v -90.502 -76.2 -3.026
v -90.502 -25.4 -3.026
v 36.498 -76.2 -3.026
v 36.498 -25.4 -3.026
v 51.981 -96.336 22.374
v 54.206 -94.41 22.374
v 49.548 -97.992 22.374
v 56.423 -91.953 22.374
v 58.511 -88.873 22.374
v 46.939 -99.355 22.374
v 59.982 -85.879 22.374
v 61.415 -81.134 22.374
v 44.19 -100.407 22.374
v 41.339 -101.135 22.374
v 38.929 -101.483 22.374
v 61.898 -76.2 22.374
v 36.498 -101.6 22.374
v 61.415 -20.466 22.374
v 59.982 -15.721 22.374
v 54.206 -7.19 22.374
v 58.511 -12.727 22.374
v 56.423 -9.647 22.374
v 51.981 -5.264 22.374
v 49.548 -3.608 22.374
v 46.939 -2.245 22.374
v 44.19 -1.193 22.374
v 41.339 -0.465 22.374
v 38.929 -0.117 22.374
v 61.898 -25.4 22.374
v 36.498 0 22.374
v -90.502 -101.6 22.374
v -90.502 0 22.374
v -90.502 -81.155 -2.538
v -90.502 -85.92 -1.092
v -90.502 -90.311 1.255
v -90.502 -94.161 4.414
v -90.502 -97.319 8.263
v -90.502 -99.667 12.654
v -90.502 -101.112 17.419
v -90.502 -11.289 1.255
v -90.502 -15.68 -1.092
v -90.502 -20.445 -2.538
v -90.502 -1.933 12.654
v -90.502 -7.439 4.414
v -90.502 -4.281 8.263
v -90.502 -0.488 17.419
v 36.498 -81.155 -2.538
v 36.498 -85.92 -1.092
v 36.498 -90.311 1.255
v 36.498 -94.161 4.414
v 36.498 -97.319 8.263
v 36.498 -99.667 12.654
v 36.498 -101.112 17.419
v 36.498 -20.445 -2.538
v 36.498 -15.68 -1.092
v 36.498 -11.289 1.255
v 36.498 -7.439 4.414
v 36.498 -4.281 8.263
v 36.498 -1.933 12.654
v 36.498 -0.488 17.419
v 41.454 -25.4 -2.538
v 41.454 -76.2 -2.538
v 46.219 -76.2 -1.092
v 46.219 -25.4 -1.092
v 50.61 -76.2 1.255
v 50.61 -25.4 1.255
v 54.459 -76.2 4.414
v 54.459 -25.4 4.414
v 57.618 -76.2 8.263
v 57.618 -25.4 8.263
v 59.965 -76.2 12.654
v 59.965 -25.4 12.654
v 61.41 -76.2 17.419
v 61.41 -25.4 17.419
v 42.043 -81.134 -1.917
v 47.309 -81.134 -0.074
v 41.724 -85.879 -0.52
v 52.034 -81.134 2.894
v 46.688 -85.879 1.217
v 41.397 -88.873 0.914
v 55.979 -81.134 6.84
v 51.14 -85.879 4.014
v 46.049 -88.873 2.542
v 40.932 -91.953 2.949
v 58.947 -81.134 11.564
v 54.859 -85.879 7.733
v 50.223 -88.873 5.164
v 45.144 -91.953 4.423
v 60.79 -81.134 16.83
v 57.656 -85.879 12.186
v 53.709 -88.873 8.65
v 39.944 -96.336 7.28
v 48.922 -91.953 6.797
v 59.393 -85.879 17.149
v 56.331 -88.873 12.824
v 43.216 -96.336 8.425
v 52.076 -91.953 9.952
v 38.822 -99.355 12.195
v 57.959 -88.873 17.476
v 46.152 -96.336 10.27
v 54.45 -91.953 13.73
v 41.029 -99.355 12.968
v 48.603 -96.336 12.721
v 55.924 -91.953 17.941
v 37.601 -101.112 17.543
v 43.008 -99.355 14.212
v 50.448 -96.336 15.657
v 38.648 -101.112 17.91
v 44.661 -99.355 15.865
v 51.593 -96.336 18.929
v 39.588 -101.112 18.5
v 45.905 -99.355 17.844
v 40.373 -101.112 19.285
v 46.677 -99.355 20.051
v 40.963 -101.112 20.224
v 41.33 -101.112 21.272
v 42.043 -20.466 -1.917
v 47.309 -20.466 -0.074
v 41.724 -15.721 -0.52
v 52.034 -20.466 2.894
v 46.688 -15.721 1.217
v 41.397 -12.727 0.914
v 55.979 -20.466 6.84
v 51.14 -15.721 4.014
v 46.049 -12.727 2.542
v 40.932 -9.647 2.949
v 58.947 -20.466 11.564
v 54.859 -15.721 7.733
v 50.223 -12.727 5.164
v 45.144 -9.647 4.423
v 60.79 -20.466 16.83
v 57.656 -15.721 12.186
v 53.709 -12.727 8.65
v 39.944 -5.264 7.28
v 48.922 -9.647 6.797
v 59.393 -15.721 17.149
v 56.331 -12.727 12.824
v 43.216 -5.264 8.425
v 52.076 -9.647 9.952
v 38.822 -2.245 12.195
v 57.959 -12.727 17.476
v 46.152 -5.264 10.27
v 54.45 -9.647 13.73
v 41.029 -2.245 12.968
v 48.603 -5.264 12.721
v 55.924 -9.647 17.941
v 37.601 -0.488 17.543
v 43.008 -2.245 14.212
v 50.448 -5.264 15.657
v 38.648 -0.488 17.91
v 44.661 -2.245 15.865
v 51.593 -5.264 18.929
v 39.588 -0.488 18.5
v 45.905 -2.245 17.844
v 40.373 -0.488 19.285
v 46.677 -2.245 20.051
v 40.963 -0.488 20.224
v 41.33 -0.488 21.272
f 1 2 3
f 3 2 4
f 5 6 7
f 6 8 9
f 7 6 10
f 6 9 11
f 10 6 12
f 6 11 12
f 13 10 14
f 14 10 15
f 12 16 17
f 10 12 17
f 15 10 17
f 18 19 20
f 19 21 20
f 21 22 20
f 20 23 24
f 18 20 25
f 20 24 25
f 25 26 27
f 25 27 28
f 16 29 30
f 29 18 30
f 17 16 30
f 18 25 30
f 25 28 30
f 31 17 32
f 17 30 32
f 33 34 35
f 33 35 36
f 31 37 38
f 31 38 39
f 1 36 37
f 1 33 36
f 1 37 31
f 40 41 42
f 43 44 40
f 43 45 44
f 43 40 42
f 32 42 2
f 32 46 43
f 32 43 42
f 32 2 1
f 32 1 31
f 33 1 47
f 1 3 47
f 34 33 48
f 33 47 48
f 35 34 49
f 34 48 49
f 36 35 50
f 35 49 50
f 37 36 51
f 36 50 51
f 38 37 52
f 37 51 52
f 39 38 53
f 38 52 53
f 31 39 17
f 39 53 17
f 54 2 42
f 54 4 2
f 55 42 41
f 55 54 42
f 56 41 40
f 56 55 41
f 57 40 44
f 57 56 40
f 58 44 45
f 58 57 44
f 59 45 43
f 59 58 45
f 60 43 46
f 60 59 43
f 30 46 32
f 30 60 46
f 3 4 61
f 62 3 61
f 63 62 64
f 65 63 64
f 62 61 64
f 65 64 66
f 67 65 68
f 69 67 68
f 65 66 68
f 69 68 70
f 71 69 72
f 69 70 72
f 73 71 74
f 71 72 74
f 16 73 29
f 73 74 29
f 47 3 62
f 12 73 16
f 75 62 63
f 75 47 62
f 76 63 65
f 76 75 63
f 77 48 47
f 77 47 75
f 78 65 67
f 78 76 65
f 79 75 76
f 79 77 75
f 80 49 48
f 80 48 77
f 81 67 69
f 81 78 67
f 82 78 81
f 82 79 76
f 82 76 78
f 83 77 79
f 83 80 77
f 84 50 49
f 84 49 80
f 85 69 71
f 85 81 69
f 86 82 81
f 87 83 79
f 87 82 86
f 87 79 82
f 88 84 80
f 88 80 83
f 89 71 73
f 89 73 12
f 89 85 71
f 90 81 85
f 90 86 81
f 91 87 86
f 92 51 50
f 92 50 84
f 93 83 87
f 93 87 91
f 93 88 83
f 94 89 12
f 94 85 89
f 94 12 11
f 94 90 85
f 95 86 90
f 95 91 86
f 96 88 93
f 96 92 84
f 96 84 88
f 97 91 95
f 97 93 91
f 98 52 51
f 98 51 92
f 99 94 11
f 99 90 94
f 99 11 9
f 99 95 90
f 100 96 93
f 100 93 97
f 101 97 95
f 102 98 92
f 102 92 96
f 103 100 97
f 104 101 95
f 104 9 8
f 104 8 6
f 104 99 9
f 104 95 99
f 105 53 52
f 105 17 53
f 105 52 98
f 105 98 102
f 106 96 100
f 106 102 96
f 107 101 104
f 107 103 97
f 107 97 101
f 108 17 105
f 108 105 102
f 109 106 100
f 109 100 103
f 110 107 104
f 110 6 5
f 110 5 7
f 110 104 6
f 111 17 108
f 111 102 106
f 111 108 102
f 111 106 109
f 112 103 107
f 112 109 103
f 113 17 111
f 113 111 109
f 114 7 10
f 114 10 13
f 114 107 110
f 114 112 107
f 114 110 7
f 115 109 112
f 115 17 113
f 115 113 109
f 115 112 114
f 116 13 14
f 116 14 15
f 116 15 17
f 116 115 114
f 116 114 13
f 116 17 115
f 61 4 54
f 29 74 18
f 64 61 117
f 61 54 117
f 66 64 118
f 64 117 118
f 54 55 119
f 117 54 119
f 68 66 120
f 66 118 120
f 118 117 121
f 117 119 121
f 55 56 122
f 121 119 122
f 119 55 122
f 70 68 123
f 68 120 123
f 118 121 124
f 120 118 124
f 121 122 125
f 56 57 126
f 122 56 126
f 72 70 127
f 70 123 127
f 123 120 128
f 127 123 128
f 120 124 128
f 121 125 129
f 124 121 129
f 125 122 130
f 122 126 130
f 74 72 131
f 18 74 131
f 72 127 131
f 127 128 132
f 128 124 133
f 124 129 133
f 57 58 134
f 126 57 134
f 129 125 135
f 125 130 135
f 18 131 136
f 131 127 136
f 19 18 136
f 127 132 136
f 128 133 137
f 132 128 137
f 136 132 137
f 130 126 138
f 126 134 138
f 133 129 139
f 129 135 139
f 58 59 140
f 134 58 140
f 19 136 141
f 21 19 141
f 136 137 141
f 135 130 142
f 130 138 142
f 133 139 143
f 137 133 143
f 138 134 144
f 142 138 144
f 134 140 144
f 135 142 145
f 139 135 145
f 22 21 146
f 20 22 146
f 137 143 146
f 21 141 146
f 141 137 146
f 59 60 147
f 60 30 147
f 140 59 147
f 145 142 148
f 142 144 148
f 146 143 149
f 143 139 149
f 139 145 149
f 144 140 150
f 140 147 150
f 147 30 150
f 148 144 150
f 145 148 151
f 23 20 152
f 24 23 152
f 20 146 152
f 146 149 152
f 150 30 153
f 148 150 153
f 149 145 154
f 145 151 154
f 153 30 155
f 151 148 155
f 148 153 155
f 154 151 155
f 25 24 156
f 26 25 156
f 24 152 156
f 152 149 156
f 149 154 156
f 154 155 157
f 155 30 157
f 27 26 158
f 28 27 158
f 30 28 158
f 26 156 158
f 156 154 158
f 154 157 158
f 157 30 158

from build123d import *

# Parameters (mm, degrees)
F0_W     = 127
F0_H     = 25.4
F1_DEPTH = 25.4
F2_DEPTH = 76.2
F3_R     = 25.39999
F4_R     = 25.39999


# Not quite as in the source:
# - a fillet or chamfer is up to 0.001 mm smaller than in the source, because OpenCascade refuses the exact size


with BuildPart() as f1:
    # F0 (on Front) → F1 (new body)
    with BuildSketch(Plane.XZ):
        with Locations((-27.0015653223, 9.674326013)):
            Rectangle(F0_W, F0_H)
        with BuildLine():
            Line((61.8984346777, 22.374326013), (36.4984346777, 22.374326013))
            Line((36.4984346777, 22.374326013), (36.4984346777, -3.025673987))
            ThreePointArc((36.4984346777, -3.025673987), (54.4589469199, 4.4138137708), (61.8984346777, 22.374326013))
        make_face()
    extrude(amount=F1_DEPTH)

    # F2 (add): a face of the model
    f2_faces = [f1.faces().sort_by_distance(p)[0] for p in [
        (-16.9176526174, -25.4, 9.9349632182),
    ]]
    extrude(f2_faces, amount=F2_DEPTH)

    # F3 (radius 25.4 in the source; OpenCascade refuses exactly that, so slightly less here)
    f3_edges = [f1.edges().sort_by_distance(p)[0] for p in [
        (-27.001565, -101.6, -3.025674),
    ]]
    fillet(f3_edges, radius=F3_R)

    # F4 (radius 25.4 in the source; OpenCascade refuses exactly that, so slightly less here)
    f4_edges = [f1.edges().sort_by_distance(p)[0] for p in [
        (-27.001565, 0, -3.025674),
    ]]
    fillet(f4_edges, radius=F4_R)


solid = f1.part
